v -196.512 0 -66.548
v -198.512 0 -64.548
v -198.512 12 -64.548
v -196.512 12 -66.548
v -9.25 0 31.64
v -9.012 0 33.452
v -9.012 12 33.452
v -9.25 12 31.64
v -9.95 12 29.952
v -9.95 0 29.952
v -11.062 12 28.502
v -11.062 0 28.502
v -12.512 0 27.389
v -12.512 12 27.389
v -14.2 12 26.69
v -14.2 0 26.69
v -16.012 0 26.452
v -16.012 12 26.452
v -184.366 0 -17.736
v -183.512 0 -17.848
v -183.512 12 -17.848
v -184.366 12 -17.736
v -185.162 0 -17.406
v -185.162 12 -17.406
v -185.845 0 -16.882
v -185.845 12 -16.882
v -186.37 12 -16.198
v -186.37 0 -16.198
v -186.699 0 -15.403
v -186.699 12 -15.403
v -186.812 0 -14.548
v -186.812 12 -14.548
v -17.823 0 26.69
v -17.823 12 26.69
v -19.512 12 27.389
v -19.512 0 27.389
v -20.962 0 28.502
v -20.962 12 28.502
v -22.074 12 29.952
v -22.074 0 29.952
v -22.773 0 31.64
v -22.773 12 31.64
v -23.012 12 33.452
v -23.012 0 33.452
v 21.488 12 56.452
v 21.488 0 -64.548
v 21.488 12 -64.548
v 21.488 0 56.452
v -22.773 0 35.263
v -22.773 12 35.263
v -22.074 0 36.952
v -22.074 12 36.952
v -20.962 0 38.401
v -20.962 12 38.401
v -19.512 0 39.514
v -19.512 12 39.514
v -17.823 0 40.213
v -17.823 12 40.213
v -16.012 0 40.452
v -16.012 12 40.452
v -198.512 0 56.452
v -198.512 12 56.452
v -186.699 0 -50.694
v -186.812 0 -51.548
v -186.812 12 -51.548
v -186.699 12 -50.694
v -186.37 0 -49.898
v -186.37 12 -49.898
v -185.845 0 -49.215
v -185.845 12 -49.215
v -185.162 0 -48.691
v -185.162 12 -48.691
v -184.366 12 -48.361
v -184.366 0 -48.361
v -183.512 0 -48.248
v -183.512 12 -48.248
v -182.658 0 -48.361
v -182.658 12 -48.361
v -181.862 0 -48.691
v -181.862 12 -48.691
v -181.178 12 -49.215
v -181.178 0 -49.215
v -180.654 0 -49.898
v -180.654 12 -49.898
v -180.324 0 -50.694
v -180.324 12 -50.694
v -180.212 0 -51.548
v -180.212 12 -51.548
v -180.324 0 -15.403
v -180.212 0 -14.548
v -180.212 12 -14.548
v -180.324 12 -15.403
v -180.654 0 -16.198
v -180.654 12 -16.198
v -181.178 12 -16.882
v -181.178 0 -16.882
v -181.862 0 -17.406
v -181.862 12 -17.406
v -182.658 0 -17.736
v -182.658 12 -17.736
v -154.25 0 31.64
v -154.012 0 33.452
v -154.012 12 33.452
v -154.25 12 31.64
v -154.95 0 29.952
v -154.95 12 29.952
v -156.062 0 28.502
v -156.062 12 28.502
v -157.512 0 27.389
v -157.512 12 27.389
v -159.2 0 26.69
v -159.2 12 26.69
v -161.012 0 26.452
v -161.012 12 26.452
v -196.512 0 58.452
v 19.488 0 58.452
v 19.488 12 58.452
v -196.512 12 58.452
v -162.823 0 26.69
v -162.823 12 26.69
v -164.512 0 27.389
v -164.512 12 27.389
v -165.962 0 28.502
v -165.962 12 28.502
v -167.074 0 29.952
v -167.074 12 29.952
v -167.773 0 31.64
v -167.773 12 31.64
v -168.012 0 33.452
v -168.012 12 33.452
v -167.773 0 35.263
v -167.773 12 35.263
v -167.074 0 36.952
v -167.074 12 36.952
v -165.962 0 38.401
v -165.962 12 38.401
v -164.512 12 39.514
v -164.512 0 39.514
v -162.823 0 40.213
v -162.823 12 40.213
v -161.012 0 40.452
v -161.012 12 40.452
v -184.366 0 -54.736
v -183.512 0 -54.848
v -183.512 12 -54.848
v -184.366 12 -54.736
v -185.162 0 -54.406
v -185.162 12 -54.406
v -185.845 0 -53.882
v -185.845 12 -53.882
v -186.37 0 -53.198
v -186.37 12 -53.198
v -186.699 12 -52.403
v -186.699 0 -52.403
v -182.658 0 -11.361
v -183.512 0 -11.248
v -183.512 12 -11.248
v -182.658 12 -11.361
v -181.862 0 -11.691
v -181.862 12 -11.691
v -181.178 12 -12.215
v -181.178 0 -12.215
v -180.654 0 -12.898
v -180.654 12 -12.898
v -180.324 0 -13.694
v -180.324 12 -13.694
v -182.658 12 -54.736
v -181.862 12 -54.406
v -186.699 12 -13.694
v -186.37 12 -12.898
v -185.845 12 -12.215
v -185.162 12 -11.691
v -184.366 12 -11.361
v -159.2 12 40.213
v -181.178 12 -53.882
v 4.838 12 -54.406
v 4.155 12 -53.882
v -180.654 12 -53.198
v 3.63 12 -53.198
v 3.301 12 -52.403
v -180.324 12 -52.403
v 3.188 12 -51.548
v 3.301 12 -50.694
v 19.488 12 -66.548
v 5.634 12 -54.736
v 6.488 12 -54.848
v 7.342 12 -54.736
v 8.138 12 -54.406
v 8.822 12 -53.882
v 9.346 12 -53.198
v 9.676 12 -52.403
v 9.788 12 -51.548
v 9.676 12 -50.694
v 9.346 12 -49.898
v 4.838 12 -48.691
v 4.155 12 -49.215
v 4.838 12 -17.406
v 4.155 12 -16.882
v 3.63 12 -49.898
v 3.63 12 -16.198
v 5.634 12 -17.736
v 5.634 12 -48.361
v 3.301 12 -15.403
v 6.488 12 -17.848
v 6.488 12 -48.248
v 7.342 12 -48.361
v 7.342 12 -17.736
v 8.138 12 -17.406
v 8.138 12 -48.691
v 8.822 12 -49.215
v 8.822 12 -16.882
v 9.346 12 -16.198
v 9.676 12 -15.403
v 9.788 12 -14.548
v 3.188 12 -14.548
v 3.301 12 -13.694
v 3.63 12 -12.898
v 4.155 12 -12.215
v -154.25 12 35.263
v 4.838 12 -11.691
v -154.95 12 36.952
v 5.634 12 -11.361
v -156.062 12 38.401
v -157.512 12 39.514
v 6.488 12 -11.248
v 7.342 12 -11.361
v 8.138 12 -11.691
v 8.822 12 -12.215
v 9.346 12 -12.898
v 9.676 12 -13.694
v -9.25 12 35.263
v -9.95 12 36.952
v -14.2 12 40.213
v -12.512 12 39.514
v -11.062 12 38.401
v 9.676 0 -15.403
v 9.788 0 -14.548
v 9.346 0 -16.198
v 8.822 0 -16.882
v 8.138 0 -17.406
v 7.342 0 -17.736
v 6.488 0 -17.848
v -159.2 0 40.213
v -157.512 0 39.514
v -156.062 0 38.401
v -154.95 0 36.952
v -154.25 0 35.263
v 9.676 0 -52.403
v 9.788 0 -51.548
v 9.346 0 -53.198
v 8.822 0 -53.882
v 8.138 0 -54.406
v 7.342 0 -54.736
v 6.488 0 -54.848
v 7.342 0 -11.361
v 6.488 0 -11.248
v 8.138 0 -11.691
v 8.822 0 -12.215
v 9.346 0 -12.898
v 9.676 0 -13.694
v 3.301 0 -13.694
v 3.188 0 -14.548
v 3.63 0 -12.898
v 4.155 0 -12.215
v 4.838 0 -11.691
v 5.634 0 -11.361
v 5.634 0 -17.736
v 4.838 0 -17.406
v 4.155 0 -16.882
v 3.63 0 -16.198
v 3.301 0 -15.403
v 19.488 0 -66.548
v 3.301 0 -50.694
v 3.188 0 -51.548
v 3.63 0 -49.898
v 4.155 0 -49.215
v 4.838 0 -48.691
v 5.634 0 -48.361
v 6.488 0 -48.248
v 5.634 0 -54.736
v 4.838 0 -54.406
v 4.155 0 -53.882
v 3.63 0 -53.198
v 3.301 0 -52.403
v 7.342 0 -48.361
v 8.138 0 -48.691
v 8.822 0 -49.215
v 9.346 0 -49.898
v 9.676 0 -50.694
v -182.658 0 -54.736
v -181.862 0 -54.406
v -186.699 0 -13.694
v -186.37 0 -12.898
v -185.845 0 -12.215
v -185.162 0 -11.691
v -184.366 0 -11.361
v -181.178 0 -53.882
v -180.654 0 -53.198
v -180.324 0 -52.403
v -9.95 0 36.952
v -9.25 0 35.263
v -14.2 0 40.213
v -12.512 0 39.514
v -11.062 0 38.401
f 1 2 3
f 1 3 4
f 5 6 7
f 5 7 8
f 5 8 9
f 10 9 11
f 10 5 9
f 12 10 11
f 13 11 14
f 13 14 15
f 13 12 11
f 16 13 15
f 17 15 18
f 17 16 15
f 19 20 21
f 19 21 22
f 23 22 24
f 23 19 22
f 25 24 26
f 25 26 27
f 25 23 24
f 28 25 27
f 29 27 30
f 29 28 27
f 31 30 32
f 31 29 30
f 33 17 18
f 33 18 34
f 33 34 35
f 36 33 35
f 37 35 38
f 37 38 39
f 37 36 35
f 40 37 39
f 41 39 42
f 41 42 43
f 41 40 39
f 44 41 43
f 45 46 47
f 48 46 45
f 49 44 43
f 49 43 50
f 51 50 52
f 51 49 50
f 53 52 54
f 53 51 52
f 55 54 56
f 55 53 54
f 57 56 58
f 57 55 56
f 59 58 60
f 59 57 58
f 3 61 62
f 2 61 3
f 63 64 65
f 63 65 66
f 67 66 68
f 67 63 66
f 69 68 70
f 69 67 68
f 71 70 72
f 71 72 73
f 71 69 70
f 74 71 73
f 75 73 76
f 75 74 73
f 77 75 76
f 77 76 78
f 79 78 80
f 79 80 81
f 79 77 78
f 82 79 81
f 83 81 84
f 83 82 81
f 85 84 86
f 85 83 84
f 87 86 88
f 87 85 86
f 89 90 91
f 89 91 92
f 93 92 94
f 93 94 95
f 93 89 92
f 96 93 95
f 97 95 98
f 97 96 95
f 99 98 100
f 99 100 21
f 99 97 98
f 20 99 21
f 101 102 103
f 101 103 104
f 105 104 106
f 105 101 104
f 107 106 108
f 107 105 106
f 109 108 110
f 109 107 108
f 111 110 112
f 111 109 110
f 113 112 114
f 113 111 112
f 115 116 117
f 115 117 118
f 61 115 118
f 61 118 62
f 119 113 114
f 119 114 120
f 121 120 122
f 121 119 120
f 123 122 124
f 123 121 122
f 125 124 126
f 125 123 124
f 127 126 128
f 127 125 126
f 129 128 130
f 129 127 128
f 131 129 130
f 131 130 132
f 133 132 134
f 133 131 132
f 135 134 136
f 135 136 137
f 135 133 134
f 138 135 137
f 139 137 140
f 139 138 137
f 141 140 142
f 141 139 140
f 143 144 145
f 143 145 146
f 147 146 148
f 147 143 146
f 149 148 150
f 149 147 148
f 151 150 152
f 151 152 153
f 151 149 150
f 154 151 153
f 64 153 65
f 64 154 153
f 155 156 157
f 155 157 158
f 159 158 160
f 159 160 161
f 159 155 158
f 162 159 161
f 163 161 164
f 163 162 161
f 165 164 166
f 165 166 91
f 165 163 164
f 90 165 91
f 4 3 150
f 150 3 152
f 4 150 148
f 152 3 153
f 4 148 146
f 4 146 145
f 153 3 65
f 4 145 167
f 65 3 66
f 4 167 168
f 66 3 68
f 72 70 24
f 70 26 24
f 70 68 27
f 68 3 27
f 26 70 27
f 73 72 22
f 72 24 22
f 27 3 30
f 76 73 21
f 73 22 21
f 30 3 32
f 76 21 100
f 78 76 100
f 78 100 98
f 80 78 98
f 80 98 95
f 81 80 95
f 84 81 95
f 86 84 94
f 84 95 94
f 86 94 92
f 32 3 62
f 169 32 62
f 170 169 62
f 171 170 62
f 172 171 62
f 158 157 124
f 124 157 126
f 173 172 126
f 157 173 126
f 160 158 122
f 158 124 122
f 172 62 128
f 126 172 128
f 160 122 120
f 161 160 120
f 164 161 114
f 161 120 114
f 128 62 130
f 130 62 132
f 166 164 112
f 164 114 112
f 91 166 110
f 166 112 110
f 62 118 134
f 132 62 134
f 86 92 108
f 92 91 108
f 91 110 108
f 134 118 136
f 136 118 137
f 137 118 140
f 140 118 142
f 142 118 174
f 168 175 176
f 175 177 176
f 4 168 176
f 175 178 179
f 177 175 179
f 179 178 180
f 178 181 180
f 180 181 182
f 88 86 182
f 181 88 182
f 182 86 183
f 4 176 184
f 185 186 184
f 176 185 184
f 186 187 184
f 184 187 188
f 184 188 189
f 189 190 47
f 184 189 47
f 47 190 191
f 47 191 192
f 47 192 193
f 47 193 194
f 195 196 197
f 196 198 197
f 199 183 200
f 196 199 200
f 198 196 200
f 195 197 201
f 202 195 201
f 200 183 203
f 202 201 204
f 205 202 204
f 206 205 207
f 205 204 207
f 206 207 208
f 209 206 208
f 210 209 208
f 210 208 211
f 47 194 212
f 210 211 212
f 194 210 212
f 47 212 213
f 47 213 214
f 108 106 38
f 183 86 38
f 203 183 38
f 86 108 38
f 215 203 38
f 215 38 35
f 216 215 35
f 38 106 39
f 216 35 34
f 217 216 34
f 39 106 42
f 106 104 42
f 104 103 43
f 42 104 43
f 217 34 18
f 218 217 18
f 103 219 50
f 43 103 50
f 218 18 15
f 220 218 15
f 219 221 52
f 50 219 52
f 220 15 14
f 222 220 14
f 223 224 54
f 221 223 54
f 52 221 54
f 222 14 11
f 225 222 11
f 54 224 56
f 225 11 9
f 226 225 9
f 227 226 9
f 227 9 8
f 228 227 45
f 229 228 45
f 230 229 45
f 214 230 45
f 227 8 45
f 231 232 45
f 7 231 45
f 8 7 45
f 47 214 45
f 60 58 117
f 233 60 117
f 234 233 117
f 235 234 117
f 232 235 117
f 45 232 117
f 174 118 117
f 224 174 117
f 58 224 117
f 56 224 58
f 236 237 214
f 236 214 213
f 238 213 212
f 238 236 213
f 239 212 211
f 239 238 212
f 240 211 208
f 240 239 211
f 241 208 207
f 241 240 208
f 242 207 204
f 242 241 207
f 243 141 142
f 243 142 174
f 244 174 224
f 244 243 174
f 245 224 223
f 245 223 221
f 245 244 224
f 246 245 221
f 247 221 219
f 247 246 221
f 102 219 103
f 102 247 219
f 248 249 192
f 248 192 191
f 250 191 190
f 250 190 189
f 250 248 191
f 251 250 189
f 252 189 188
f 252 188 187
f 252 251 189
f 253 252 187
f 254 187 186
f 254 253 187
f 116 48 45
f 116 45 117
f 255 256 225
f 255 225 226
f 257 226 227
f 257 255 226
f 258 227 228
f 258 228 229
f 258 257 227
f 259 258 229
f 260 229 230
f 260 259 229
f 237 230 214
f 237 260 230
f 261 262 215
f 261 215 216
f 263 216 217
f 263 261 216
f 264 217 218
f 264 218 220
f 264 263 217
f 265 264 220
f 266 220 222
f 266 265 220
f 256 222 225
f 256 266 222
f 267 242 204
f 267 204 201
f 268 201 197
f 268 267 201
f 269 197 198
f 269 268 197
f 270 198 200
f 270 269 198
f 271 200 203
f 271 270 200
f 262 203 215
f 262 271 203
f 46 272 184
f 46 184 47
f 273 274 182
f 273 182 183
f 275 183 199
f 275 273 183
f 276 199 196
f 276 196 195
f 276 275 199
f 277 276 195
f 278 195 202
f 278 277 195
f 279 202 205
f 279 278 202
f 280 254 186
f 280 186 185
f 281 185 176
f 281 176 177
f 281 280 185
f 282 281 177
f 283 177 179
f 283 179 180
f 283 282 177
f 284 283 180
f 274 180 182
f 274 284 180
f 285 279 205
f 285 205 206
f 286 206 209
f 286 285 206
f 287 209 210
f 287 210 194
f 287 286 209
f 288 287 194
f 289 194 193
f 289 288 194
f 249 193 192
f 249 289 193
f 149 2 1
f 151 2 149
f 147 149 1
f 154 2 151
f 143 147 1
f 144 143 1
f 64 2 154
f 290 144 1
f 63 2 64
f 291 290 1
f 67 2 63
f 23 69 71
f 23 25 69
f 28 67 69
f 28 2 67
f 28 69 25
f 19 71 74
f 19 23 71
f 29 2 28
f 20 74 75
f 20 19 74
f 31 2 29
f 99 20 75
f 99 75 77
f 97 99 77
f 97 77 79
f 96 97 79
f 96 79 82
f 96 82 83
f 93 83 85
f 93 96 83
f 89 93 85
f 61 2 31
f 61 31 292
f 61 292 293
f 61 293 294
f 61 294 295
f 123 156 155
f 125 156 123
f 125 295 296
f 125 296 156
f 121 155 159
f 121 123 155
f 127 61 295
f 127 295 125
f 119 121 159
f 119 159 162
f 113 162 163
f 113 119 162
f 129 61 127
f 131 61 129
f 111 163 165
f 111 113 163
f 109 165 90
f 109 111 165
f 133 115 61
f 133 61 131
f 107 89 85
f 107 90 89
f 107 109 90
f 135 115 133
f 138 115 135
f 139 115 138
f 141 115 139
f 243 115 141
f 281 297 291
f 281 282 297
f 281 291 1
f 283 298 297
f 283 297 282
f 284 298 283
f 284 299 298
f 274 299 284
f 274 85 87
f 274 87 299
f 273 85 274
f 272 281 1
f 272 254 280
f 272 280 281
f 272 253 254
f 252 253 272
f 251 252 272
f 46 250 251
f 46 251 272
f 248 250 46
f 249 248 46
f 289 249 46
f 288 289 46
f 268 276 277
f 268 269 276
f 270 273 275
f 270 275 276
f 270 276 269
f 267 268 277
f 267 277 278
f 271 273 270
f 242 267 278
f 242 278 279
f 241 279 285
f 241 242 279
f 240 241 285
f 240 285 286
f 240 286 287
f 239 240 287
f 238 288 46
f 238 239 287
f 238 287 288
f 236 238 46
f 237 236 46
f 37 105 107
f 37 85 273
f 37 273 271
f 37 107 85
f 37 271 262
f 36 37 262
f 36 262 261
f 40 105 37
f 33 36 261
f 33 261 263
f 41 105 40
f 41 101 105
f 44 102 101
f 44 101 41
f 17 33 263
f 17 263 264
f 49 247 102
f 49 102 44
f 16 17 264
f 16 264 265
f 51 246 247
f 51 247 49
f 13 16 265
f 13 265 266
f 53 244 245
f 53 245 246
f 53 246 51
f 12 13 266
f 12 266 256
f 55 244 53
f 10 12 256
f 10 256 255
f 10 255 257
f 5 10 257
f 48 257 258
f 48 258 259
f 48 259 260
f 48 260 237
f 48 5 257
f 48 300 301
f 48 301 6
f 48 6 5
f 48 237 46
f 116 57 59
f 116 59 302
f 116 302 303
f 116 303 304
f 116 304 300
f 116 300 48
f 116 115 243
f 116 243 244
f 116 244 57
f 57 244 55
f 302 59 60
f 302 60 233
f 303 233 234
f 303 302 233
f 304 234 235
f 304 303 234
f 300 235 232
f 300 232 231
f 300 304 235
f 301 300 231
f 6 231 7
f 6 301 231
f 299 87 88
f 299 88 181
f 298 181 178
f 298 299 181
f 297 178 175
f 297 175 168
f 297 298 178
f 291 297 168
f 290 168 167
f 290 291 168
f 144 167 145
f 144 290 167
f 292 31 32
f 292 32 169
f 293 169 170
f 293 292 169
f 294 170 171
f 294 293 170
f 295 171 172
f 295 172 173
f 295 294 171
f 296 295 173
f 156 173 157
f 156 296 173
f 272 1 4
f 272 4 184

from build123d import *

# Parameters (mm, degrees)
F1_DEPTH = 12


with BuildPart() as f1:
    # F0 (on Front) → F1 (new body)
    with BuildSketch(Plane.XZ):
        Polygon((-196.511762, -66.548446), (19.488238, -66.548446), (21.488238, -64.548446), (21.488238, 56.451554), (19.488238, 58.451554), (-196.511762, 58.451554), (-198.511762, 56.451554), (-198.511762, -64.548446), align=None)
        with BuildLine():
            ThreePointArc((-186.811762, -51.548446), (-185.845214, -49.214994), (-183.511762, -48.248446))
            ThreePointArc((-183.511762, -48.248446), (-181.17831, -49.214994), (-180.211762, -51.548446))
            ThreePointArc((-180.211762, -51.548446), (-181.17831, -53.881898), (-183.511762, -54.848446))
            ThreePointArc((-183.511762, -54.848446), (-185.845214, -53.881898), (-186.811762, -51.548446))
        make_face(mode=Mode.SUBTRACT)
        with BuildLine():
            ThreePointArc((-180.211762, -14.548446), (-181.17831, -16.881898), (-183.511762, -17.848446))
            ThreePointArc((-183.511762, -17.848446), (-185.845214, -16.881898), (-186.811762, -14.548446))
            ThreePointArc((-186.811762, -14.548446), (-185.845214, -12.214994), (-183.511762, -11.248446))
            ThreePointArc((-183.511762, -11.248446), (-181.17831, -12.214994), (-180.211762, -14.548446))
        make_face(mode=Mode.SUBTRACT)
        with BuildLine():
            ThreePointArc((3.188238, -51.548446), (4.154786, -49.214994), (6.488238, -48.248446))
            ThreePointArc((6.488238, -48.248446), (8.82169, -49.214994), (9.788238, -51.548446))
            ThreePointArc((9.788238, -51.548446), (8.82169, -53.881898), (6.488238, -54.848446))
            ThreePointArc((6.488238, -54.848446), (4.154786, -53.881898), (3.188238, -51.548446))
        make_face(mode=Mode.SUBTRACT)
        with BuildLine():
            ThreePointArc((6.488238, -17.848446), (4.154786, -16.881898), (3.188238, -14.548446))
            ThreePointArc((3.188238, -14.548446), (4.154786, -12.214994), (6.488238, -11.248446))
            ThreePointArc((6.488238, -11.248446), (8.82169, -12.214994), (9.788238, -14.548446))
            ThreePointArc((9.788238, -14.548446), (8.82169, -16.881898), (6.488238, -17.848446))
        make_face(mode=Mode.SUBTRACT)
        with BuildLine():
            ThreePointArc((-161.011762, 40.451554), (-156.062015, 38.401301), (-154.011762, 33.451554))
            ThreePointArc((-154.011762, 33.451554), (-156.062015, 28.501807), (-161.011762, 26.451554))
            ThreePointArc((-161.011762, 26.451554), (-165.961509, 28.501807), (-168.011762, 33.451554))
            ThreePointArc((-168.011762, 33.451554), (-165.961509, 38.401301), (-161.011762, 40.451554))
        make_face(mode=Mode.SUBTRACT)
        with BuildLine():
            ThreePointArc((-16.011762, 40.451554), (-11.062015, 38.401301), (-9.011762, 33.451554))
            ThreePointArc((-9.011762, 33.451554), (-11.062015, 28.501807), (-16.011762, 26.451554))
            ThreePointArc((-16.011762, 26.451554), (-20.961509, 28.501807), (-23.011762, 33.451554))
            ThreePointArc((-23.011762, 33.451554), (-20.961509, 38.401301), (-16.011762, 40.451554))
        make_face(mode=Mode.SUBTRACT)
    extrude(amount=-F1_DEPTH)


solid = f1.part
